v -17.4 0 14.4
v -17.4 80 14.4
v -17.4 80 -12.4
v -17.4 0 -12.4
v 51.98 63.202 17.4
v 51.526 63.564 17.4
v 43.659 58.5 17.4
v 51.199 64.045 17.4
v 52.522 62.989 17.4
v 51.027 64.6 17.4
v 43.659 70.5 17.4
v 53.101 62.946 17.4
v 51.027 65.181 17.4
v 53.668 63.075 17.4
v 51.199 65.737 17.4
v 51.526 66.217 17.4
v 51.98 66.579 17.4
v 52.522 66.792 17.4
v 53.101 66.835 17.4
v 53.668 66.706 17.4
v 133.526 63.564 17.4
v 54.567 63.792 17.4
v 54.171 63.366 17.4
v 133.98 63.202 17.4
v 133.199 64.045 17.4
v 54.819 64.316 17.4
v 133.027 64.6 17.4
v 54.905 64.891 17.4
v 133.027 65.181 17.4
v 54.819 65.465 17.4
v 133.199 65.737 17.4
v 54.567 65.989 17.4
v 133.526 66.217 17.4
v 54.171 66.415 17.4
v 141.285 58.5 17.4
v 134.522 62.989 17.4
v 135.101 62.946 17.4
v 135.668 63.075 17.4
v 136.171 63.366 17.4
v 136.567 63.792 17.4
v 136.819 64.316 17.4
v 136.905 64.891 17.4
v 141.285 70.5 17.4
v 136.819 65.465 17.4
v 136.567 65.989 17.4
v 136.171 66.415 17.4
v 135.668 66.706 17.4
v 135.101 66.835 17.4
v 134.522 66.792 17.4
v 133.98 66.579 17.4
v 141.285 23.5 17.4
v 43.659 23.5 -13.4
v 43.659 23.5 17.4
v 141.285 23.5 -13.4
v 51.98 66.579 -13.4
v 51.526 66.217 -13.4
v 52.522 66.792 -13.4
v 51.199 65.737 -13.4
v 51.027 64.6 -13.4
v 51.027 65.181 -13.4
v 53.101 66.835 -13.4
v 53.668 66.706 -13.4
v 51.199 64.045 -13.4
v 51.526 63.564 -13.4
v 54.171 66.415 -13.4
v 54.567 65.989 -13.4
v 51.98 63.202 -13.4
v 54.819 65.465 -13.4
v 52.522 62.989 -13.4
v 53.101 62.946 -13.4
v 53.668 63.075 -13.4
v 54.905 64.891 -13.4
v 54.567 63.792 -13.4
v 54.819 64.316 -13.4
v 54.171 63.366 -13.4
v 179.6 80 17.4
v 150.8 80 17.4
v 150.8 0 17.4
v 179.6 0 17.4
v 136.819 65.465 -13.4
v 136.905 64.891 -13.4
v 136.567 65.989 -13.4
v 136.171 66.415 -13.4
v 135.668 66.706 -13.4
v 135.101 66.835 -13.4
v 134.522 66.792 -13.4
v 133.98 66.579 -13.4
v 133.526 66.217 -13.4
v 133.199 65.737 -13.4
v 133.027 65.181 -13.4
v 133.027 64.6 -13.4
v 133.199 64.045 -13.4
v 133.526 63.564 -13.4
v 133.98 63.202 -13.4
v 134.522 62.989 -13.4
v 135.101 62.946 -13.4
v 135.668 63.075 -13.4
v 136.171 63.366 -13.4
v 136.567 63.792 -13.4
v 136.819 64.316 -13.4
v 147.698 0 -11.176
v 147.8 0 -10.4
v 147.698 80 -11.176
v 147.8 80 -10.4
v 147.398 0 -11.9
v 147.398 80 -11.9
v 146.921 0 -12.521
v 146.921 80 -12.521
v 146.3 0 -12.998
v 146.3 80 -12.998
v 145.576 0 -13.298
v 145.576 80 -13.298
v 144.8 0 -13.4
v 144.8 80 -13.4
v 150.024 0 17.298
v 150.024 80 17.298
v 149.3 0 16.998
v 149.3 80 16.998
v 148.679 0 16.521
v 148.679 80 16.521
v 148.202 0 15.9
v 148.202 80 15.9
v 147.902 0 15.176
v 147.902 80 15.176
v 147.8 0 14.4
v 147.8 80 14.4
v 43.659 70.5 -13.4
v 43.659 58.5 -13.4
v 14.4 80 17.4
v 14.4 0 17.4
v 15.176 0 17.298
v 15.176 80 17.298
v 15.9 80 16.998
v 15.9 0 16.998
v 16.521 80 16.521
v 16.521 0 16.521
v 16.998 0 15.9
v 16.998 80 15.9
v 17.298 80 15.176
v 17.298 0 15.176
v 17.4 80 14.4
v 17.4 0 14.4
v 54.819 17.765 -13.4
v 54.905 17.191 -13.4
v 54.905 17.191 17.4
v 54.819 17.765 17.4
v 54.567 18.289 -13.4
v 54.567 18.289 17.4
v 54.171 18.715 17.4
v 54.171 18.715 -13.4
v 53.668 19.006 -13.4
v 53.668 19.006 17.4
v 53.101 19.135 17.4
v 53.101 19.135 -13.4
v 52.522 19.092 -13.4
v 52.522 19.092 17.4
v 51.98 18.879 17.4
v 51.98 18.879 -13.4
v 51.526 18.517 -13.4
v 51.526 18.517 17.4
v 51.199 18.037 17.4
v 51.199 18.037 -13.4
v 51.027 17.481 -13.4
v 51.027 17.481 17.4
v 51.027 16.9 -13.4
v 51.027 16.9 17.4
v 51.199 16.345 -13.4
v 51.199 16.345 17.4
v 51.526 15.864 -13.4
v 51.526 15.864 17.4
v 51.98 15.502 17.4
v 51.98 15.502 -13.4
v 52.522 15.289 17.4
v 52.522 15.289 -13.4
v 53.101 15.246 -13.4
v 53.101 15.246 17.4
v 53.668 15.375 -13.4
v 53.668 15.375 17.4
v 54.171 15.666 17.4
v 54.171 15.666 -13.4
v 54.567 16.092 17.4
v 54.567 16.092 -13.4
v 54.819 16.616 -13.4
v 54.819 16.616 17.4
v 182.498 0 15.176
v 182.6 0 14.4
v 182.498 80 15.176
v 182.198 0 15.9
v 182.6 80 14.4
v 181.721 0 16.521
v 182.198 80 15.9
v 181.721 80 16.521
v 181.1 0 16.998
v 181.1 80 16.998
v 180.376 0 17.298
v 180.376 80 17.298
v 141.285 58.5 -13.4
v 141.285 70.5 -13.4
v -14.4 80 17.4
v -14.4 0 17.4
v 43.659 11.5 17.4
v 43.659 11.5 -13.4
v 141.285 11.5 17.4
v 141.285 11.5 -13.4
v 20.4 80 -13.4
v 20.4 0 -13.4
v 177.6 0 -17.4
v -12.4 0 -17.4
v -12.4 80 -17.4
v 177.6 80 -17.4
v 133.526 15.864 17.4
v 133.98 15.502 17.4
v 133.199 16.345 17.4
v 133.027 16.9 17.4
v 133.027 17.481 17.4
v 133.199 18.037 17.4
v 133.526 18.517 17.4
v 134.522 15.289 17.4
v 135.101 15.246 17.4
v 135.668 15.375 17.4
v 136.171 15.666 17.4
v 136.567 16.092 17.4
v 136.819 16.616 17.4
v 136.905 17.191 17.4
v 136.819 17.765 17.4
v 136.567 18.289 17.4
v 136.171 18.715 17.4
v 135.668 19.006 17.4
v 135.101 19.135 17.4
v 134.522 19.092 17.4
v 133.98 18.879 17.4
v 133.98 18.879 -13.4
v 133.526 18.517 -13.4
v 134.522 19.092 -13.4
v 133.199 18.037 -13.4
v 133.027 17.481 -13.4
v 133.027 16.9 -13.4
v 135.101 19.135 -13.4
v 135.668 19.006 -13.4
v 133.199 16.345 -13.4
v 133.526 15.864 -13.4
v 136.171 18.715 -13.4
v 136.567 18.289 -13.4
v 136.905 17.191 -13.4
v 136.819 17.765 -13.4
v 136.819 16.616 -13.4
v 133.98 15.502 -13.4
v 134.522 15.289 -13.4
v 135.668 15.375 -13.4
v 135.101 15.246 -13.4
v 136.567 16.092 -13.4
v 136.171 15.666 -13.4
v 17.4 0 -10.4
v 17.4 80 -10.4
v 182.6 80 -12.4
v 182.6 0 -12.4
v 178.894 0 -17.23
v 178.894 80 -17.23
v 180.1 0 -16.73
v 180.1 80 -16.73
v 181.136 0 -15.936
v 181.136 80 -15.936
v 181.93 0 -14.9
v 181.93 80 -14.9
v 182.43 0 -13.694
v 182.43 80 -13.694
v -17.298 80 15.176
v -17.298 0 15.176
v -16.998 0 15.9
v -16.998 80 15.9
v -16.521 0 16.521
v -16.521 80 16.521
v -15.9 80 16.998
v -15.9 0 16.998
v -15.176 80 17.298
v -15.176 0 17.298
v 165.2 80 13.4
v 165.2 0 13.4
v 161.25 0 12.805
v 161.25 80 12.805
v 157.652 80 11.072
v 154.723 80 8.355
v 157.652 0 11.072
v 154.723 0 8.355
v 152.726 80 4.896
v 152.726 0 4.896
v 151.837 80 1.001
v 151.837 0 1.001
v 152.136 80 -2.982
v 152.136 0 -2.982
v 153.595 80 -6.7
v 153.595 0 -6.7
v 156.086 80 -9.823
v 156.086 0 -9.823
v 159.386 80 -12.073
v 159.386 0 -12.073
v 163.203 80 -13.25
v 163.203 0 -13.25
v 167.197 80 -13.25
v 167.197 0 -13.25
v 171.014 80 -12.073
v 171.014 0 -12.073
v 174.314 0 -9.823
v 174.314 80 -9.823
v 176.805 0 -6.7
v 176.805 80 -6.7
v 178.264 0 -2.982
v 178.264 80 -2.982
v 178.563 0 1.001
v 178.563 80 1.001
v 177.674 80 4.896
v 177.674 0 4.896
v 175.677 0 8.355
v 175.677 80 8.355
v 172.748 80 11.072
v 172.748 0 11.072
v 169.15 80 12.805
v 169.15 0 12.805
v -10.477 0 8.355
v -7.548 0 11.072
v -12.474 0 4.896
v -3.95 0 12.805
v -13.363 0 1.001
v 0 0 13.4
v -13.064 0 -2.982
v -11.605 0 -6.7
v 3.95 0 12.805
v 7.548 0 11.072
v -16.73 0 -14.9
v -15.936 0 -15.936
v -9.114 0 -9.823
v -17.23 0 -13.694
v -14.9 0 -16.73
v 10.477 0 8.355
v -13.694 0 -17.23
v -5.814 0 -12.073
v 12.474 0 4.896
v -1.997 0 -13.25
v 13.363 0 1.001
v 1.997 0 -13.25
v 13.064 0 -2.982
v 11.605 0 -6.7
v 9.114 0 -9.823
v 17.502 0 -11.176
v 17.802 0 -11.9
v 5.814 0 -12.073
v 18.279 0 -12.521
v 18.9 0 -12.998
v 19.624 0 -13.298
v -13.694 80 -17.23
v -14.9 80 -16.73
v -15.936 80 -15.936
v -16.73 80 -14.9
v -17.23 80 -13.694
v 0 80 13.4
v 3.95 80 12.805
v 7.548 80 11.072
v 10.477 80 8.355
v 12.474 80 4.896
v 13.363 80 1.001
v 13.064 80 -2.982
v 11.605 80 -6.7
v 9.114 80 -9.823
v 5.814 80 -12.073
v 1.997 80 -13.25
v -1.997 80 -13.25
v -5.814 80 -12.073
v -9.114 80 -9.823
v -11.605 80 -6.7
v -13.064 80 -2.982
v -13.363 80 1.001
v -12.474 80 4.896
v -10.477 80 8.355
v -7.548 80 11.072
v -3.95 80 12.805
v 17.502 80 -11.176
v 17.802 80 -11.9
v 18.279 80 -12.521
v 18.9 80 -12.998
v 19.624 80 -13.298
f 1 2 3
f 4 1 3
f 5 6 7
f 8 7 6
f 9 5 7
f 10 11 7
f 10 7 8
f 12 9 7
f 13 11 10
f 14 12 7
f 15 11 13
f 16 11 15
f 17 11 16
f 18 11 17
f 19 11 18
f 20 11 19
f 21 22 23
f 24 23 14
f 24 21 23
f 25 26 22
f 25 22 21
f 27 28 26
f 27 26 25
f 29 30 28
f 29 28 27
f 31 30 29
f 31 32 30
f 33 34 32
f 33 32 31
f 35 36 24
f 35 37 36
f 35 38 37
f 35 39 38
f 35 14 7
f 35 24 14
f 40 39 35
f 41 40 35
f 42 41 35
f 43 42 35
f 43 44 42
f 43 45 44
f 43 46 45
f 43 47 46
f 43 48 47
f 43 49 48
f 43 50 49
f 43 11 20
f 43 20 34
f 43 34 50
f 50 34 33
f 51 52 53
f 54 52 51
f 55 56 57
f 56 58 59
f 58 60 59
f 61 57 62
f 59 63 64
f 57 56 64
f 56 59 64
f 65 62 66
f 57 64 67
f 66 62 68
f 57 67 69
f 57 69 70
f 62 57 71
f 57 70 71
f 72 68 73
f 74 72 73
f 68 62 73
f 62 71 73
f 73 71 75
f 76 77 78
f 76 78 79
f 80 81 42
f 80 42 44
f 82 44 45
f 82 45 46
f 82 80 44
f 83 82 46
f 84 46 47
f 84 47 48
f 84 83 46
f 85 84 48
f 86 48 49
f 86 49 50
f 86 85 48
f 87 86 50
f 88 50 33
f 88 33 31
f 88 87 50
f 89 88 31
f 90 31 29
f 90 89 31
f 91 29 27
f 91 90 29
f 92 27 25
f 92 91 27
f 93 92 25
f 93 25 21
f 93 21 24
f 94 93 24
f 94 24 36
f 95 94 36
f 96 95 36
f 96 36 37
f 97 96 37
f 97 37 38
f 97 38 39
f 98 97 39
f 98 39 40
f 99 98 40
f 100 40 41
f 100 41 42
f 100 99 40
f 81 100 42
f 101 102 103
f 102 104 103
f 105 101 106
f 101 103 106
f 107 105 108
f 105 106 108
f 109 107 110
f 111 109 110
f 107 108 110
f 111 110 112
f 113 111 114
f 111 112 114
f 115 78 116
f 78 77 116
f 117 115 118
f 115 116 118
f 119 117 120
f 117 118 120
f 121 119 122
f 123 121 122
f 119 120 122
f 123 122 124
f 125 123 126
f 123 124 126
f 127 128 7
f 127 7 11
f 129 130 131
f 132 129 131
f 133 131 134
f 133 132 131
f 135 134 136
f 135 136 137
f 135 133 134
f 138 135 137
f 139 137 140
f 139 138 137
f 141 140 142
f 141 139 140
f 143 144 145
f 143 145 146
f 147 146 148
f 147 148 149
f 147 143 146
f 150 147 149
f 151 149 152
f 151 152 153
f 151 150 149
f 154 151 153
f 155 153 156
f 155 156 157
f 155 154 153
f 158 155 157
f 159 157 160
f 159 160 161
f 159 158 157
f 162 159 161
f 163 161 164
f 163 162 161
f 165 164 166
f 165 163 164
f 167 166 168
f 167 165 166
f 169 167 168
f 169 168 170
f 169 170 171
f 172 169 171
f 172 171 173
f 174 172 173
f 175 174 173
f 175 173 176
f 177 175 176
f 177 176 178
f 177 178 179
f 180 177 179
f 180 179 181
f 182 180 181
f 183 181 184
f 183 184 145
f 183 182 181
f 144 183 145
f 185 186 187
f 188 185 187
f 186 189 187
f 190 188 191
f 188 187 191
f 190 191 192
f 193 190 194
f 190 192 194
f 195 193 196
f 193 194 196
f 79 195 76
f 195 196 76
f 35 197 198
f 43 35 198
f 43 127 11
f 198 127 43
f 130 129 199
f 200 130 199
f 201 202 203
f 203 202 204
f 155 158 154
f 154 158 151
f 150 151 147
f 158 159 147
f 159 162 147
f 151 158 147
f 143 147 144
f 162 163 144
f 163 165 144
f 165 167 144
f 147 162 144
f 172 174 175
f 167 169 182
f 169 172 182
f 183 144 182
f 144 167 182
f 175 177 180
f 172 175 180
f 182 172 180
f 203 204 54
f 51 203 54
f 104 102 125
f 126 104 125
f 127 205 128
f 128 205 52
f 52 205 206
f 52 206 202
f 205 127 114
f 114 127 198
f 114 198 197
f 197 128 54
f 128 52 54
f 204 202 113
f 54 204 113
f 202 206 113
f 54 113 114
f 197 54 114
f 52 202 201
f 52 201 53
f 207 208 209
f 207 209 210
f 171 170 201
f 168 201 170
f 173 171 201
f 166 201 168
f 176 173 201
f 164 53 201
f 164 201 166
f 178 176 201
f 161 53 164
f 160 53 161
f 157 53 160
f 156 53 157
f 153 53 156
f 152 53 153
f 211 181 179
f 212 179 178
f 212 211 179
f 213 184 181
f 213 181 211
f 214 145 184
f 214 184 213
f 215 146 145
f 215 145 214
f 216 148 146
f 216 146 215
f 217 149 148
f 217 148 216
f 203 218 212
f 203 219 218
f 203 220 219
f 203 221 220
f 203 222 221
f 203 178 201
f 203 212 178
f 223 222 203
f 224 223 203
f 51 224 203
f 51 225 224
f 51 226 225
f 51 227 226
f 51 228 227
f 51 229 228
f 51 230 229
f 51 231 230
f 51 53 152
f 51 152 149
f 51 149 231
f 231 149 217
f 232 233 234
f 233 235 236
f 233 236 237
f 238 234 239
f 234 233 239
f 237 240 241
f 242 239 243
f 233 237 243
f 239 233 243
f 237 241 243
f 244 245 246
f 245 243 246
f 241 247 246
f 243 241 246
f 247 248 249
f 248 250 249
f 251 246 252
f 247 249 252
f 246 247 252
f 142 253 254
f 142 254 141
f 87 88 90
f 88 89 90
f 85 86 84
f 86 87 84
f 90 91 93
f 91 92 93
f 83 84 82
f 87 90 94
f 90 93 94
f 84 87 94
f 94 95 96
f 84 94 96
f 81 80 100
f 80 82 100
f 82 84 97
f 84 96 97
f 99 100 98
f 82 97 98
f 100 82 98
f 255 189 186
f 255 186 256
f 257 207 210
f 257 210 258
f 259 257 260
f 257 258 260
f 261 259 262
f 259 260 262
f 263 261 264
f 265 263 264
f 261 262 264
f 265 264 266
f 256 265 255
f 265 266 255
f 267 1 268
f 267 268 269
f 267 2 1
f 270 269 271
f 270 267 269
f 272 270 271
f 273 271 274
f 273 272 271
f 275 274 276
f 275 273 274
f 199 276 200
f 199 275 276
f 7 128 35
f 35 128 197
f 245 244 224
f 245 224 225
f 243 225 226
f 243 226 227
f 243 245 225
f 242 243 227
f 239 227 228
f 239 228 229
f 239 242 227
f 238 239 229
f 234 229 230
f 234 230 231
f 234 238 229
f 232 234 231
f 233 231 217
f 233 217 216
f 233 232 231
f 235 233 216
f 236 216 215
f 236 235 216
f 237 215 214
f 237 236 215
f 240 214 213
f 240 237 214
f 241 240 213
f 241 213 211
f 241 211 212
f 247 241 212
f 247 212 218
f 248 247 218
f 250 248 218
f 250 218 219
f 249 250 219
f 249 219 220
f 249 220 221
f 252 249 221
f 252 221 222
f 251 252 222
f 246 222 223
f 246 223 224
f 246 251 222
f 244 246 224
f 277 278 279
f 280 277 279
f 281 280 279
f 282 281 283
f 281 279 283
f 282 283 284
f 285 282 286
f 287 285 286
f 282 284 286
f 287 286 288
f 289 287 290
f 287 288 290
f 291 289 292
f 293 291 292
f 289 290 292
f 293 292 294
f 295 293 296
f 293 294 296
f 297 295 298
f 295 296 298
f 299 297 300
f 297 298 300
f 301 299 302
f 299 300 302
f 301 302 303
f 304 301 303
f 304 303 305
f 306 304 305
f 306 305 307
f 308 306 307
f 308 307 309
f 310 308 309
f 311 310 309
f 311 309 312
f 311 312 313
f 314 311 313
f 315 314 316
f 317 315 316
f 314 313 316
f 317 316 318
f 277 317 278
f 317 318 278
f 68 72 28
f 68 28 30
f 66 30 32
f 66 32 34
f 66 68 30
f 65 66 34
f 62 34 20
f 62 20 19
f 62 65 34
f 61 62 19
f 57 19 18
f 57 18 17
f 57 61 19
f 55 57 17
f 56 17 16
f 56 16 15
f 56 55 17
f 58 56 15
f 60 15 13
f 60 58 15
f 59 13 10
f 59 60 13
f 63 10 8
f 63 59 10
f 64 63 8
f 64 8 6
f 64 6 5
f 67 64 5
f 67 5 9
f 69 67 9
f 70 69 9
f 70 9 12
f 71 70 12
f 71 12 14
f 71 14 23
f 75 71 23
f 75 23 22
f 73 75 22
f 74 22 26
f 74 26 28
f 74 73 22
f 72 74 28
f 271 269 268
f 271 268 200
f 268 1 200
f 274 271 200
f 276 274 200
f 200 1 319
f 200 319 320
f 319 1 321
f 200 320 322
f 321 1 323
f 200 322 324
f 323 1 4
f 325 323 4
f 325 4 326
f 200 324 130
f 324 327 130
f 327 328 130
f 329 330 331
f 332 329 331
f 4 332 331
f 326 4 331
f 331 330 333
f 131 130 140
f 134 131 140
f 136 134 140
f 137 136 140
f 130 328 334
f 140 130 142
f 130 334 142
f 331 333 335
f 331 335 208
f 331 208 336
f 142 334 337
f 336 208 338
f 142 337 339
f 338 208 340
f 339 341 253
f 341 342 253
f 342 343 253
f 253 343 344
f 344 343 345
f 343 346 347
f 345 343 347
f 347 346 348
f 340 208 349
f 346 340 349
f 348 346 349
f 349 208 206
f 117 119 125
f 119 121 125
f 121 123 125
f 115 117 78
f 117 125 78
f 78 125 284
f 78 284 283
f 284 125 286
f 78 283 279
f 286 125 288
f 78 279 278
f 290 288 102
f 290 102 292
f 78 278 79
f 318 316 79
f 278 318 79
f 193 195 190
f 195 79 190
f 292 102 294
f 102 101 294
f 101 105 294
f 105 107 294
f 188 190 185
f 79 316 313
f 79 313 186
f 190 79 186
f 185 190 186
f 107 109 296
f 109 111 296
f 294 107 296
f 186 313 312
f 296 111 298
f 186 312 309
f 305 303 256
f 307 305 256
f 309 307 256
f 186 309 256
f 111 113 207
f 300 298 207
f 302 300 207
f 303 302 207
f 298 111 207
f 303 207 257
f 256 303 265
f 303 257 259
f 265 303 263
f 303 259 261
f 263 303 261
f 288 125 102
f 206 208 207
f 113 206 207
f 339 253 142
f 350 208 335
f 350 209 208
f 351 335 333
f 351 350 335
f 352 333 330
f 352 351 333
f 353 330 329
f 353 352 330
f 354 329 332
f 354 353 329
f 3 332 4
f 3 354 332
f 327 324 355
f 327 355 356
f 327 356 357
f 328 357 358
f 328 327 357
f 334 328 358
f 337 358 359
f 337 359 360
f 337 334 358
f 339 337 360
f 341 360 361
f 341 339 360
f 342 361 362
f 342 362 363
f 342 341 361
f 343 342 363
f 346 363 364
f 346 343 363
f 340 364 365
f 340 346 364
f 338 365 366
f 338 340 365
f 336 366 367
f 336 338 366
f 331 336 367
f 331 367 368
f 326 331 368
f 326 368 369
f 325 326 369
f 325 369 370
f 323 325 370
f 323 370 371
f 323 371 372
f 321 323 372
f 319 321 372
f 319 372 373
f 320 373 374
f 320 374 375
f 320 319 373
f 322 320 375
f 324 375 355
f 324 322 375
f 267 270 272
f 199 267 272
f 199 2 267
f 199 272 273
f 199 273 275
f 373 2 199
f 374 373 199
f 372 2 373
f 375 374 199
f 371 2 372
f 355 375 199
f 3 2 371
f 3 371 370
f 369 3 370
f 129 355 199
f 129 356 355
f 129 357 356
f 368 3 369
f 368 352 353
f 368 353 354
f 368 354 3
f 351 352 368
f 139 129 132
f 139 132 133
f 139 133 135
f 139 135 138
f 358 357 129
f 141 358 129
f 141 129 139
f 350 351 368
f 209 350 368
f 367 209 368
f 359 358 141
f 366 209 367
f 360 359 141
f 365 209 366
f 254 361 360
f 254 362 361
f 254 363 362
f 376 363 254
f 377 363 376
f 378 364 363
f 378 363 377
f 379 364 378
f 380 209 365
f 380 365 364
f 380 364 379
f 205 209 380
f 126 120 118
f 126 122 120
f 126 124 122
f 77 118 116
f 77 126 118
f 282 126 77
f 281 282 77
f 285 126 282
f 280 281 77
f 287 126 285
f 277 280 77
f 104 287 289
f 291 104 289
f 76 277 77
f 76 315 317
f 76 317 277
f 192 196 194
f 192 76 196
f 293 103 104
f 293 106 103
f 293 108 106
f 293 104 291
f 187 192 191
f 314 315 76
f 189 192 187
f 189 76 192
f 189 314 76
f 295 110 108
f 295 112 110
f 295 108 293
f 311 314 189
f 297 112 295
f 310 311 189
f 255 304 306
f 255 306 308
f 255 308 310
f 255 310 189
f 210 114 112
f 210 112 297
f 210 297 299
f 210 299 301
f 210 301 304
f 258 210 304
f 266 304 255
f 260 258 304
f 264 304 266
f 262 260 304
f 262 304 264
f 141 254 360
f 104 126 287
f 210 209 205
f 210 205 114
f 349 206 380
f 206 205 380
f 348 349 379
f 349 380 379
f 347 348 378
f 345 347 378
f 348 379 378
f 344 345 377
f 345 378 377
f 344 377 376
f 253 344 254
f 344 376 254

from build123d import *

# Parameters (mm, degrees)
SKETCH1_R           = 13.4
BOSS_EXTRUDE1_DEPTH = 80
FILLET1_R           = 5
FILLET2_R           = 3
FILLET3_R           = 3
SKETCH2_W           = 97.626120272
SKETCH2_H           = 12
SKETCH2_R           = 1.95
BOSS_EXTRUDE2_DEPTH = 30.8


with BuildPart() as part:
    # Sketch1 → Boss-Extrude1 (new body)
    with BuildSketch(Plane(origin=(0, 0, 0), x_dir=(1, 0, 0), z_dir=(0, 1, 0))):
        Polygon((-17.4, 17.4), (17.4, 17.4), (82.6, 17.4), (82.6, 13.4), (17.4, 13.4), (17.4, -17.4), (-17.4, -17.4), align=None)
        with Locations(Location((0, 0, 0), (0, 0, 270))):
            Circle(SKETCH1_R, mode=Mode.SUBTRACT)
    boss_extrude1 = extrude(amount=BOSS_EXTRUDE1_DEPTH)

    # Mirror3: Boss-Extrude1 across plane
    add(boss_extrude1.mirror(Plane(origin=(82.6, 80, 0), x_dir=(0, 0, 1), z_dir=(1, 0, 0))))

    # Fillet1
    fillet1_edges = [part.edges().sort_by_distance(p)[0] for p in [
        (-17.4, 40, -17.4),
        (182.6, 40, -17.4),
    ]]
    fillet(fillet1_edges, radius=FILLET1_R)

    # Fillet2
    fillet2_edges = [part.edges().sort_by_distance(p)[0] for p in [
        (17.4, 40, 17.4),
        (-17.4, 40, 17.4),
        (147.8, 40, 17.4),
        (182.6, 40, 17.4),
    ]]
    fillet(fillet2_edges, radius=FILLET2_R)

    # Fillet3
    fillet3_edges = [part.edges().sort_by_distance(p)[0] for p in [
        (17.4, 40, -13.4),
        (147.8, 40, -13.4),
    ]]
    fillet(fillet3_edges, radius=FILLET3_R)

    # Sketch2 → Boss-Extrude2 (add)
    # profile 1 of 2: a face of its own
    with BuildSketch(Plane.XY.offset(-13.4)):
        with Locations((92.472437585, 17.5)):
            Rectangle(SKETCH2_W, SKETCH2_H)
        with Locations((52.955461896, 17.190605429)):
            Circle(SKETCH2_R, mode=Mode.SUBTRACT)
        with Locations((134.955461896, 17.190605429)):
            Circle(SKETCH2_R, mode=Mode.SUBTRACT)
    # profile 2 of 2: a face of its own
    with BuildSketch(Plane.XY.offset(-13.4)):
        with Locations((92.472437585, 64.5)):
            Rectangle(SKETCH2_W, SKETCH2_H)
        with Locations((52.955461896, 64.890605429)):
            Circle(SKETCH2_R, mode=Mode.SUBTRACT)
        with Locations((134.955461896, 64.890605429)):
            Circle(SKETCH2_R, mode=Mode.SUBTRACT)
    extrude(amount=BOSS_EXTRUDE2_DEPTH)


solid = part.part
